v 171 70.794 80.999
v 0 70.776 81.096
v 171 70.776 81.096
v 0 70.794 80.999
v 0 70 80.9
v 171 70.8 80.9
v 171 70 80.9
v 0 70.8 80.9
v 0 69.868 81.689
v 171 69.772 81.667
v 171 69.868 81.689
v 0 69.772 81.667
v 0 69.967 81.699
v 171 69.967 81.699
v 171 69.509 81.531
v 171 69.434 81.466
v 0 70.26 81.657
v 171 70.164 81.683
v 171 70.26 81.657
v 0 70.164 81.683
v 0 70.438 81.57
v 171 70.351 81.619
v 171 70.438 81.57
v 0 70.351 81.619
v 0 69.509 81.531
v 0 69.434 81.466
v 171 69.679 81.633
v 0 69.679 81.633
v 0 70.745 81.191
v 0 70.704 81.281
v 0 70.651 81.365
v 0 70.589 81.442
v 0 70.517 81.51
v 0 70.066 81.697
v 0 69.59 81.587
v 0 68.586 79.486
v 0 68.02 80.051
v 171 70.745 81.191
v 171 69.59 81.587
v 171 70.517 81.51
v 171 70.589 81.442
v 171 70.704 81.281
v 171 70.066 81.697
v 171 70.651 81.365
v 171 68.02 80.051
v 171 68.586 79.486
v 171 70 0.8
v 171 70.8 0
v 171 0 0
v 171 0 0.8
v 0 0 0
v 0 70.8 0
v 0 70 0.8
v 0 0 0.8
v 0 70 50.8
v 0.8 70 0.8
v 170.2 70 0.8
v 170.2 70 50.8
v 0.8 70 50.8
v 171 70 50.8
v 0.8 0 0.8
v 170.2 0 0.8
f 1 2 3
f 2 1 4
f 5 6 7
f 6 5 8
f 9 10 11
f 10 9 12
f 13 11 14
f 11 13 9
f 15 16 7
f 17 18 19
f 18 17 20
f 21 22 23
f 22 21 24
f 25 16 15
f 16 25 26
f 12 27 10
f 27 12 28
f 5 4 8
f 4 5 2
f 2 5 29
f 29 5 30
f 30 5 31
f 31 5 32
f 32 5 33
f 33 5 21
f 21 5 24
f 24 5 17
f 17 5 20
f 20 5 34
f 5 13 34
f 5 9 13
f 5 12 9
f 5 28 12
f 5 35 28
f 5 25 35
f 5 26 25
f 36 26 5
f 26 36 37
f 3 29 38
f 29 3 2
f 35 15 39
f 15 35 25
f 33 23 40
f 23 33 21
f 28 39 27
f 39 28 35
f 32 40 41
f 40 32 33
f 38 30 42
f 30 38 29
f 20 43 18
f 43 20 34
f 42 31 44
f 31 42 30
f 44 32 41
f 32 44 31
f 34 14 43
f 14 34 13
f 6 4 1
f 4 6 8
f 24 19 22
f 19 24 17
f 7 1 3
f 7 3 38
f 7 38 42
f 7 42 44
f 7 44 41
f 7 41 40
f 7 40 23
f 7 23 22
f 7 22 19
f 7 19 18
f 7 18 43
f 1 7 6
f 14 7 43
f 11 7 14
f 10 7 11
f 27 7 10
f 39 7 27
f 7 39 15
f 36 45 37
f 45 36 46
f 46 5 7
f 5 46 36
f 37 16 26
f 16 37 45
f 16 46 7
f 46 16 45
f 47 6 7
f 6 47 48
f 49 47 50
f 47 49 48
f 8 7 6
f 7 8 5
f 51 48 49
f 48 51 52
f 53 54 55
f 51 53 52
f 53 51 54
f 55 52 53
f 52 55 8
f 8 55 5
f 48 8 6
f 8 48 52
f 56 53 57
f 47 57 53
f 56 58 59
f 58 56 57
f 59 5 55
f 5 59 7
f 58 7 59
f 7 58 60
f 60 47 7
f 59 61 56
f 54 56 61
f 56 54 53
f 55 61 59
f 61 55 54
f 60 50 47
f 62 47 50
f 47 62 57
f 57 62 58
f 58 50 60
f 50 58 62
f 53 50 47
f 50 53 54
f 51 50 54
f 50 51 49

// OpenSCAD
lip_height = 30.1;
hang_height = 50;
width = 171;
depth = 70;

thickness = 0.8;
overhang = 2;
$fa = 1;
$fs = 0.1;

cube([width, depth, thickness]);
translate([0, depth, 0]) {
	cube([width, thickness, hang_height + lip_height + thickness]);
	translate([0, 0, hang_height + lip_height + thickness]) {
		rotate([90, 0, 90]) {
			rotate_extrude(angle=135) {
				square([thickness, width]);
			}
		}
		rotate([135, 0, 0]) {
			cube([width, thickness, overhang]);
		}
	}
}
translate([0, 0, thickness]) {
	difference() {
		cube([thickness, depth, hang_height]);
		rotate([atan2(hang_height, depth), 0, 0]) {
			cube([thickness, depth + hang_height, depth + hang_height]);
		}
	}
}
translate([width - thickness, 0, thickness]) {
	difference() {
		cube([thickness, depth, hang_height]);
		rotate([atan2(hang_height, depth), 0, 0]) {
			cube([thickness, depth + hang_height, depth + hang_height]);
		}
	}
}
